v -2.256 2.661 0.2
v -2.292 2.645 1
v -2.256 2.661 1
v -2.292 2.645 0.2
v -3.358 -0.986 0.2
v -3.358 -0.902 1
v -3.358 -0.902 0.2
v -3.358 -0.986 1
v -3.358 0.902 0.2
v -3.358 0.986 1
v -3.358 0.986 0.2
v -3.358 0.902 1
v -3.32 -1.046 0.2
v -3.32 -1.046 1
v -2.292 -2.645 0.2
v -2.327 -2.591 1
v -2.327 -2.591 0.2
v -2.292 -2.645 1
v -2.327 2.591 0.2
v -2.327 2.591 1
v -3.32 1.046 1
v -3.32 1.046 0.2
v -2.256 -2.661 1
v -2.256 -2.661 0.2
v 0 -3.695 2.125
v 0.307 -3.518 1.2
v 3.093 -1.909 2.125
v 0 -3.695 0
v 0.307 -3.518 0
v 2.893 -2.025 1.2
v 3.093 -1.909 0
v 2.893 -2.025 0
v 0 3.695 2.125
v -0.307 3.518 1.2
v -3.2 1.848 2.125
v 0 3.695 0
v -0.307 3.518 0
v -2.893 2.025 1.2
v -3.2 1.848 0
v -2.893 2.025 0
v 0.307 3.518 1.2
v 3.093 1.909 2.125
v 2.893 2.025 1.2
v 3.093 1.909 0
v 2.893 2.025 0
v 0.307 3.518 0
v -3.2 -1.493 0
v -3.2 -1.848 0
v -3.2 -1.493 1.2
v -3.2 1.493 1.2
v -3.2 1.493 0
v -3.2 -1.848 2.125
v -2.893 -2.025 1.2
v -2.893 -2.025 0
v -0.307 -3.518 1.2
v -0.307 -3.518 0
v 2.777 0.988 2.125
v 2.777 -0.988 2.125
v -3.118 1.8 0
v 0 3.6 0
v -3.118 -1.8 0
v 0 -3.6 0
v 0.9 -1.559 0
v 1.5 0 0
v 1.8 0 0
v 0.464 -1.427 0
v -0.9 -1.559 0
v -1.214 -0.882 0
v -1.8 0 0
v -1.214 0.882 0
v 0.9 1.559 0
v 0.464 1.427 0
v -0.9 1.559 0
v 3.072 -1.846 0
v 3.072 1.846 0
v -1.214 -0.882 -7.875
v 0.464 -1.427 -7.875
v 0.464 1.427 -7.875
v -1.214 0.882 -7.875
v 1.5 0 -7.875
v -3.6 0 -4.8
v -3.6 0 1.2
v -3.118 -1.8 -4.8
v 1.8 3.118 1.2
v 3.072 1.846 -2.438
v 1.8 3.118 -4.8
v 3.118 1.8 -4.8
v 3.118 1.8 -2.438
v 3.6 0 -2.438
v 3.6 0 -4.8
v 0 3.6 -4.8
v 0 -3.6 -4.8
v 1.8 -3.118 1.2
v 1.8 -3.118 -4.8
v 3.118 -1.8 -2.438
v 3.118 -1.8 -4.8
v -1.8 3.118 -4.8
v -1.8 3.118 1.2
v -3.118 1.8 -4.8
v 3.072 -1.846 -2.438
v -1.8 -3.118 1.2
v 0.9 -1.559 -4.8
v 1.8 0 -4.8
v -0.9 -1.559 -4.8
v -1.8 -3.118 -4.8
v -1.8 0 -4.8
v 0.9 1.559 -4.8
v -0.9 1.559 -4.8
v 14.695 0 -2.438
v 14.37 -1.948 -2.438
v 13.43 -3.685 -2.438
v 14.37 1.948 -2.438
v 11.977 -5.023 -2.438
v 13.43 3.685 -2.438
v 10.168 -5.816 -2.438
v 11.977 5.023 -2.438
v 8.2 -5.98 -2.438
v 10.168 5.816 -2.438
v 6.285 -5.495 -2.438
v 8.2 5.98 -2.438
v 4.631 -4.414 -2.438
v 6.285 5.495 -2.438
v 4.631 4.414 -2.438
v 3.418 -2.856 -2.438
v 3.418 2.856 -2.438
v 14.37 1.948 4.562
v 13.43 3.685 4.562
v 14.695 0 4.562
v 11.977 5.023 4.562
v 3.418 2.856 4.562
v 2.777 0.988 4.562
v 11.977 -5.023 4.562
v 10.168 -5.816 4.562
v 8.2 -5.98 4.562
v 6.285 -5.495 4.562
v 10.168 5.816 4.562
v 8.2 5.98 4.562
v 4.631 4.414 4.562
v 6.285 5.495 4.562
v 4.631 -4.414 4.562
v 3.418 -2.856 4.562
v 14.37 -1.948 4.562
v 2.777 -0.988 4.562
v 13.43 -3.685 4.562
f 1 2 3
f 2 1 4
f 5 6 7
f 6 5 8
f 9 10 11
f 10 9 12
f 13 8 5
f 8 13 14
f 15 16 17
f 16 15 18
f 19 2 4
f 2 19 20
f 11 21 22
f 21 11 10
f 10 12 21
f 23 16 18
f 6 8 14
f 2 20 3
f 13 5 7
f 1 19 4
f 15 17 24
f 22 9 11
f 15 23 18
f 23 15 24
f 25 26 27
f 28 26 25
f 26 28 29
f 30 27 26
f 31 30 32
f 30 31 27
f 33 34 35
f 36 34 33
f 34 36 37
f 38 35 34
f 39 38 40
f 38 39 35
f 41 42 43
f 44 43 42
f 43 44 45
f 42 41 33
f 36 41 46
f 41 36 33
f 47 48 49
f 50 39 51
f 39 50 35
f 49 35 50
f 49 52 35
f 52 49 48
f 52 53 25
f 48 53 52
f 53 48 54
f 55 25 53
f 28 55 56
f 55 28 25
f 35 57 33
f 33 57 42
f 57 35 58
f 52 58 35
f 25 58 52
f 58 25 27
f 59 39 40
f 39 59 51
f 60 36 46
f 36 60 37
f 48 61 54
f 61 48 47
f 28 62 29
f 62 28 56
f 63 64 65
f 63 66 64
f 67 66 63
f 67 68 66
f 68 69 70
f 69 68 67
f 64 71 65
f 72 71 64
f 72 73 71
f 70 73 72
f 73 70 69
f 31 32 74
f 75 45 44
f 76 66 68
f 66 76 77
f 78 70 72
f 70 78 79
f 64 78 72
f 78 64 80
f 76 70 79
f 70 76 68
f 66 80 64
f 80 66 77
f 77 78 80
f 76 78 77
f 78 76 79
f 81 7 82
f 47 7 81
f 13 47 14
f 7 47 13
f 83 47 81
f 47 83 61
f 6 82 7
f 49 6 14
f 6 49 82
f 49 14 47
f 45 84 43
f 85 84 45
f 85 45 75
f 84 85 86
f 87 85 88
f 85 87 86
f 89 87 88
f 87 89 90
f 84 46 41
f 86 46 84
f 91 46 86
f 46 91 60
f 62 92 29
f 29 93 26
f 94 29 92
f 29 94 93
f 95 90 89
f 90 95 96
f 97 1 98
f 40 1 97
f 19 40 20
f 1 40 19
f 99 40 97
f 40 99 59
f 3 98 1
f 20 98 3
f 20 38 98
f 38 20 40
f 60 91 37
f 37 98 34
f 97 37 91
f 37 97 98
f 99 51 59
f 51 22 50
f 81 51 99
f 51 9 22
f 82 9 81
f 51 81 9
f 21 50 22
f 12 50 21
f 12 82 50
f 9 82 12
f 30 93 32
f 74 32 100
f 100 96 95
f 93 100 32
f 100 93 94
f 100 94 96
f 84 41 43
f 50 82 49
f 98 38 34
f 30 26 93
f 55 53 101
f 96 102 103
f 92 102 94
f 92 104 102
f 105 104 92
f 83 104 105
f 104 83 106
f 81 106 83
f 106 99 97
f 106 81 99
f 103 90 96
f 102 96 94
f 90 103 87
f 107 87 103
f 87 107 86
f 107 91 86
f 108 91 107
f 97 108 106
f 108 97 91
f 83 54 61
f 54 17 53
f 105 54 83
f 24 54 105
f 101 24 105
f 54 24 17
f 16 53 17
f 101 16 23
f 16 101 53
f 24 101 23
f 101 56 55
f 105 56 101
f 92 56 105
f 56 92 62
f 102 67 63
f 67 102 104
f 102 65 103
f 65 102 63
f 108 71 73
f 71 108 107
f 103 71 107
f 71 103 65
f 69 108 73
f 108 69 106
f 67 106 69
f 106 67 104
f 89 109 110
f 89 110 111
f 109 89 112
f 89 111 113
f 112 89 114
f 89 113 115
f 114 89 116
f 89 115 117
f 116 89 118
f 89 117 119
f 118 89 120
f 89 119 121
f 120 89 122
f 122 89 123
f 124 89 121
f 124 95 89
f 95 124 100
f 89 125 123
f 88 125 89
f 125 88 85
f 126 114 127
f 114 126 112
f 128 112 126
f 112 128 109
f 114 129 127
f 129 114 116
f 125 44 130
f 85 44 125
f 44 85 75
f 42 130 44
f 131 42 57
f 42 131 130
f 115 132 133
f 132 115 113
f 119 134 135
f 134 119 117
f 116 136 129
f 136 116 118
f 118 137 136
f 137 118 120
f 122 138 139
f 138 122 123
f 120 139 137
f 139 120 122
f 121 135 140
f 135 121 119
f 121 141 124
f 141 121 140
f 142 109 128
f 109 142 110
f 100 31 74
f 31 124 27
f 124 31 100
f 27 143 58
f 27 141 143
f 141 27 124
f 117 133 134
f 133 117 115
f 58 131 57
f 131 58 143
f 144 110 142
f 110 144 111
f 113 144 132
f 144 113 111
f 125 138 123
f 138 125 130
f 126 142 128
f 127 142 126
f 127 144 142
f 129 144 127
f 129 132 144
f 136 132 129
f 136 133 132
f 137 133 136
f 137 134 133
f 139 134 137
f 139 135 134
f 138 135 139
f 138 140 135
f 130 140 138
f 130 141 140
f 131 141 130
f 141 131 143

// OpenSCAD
// Parameters
shaft_diameter_mm = 3; //[1.5:6:0.1]
length_mm = 10; //[5:20:0.5]
head_across_flats_mm = 6.4; //[3.2:12.8:0.1]
head_height_mm = 2.125; //[1.0625:4.25:0.025]
washer_outer_diameter_mm = 7; //[4:14:0.1]
washer_thickness_mm = 0.8; //[0.4:2:0.05]
washer_hole_clearance_mm = 0.3; //[0.1:0.8:0.05]
spacer_height_mm = 6; //[3:12:0.5]
spacer_wall_mm = 1.8; //[0.9:3.6:0.1]
spacer_clearance_mm = 0.3; //[0.1:0.8:0.05]
buzzer_diameter_mm = 12; //[6:24:0.5]
buzzer_height_mm = 7; //[3.5:14:0.5]
buzzer_offset_x_mm = 10; //[5:20:0.5]
overlap_mm = 1; //[0.5:2:0.1]

// Derived
shaft_r  = shaft_diameter_mm/2;
head_r   = head_across_flats_mm/(2*cos(30)); // circumscribed radius for $fn=6
washer_r = washer_outer_diameter_mm/2;

// Z layout (non-centered solids for robust stacking)
z_head_bottom   = 0;
z_head_top      = z_head_bottom + head_height_mm;

// FIX: make the shank start inside the head and extend down to full length.
// This guarantees a real overlap/merge with the head (no tangential contact).
z_shank_top     = z_head_top - overlap_mm;          // inside head by overlap_mm
z_shank_bottom  = z_head_top - length_mm;           // overall screw length from head top to tip
shank_h         = z_shank_top - z_shank_bottom;     // = length_mm - overlap_mm

// Washer under head, overlapping into head by overlap_mm
z_washer_top    = z_head_bottom + overlap_mm;
z_washer_bottom = z_washer_top - washer_thickness_mm;

// Spacer under washer, overlapping into washer by overlap_mm
z_spacer_top    = z_washer_bottom + overlap_mm;
z_spacer_bottom = z_spacer_top - spacer_height_mm;

// Place buzzer so it physically intersects the head on the side by ~overlap_mm
buzzer_x = head_r + buzzer_diameter_mm/2 - overlap_mm;
buzzer_z = (z_head_bottom + z_head_top)/2;

// Screw and Washer - fused geometry
module screw_and_washer() {
  union() {
    // Hex Head (base at z=0)
    color("DimGray")
      rotate([0, 0, 30])
        translate([0, 0, z_head_bottom])
          cylinder(h=head_height_mm, r=head_r, center=false, $fn=6);

    // Shank (overlaps into head by overlap_mm; full length measured from head top)
    color("DimGray")
      translate([0, 0, z_shank_bottom])
        cylinder(h=shank_h, r=shaft_r, center=false);

    // Washer (overlaps into head by overlap_mm)
    color("DimGray")
      difference() {
        translate([0, 0, z_washer_bottom])
          cylinder(h=washer_thickness_mm, r=washer_r, center=false);
        translate([0, 0, z_washer_bottom - overlap_mm])
          cylinder(h=washer_thickness_mm + 2*overlap_mm,
                   r=(shaft_diameter_mm + washer_hole_clearance_mm)/2,
                   center=false);
      }
  }
}

// PCB Spacer - positioned to overlap washer by overlap_mm
module pcb_spacer() {
  color("Silver")
    difference() {
      translate([0, 0, z_spacer_bottom])
        cylinder(h=spacer_height_mm,
                 r=(shaft_r + spacer_clearance_mm) + spacer_wall_mm,
                 center=false);
      translate([0, 0, z_spacer_bottom - overlap_mm])
        cylinder(h=spacer_height_mm + 2*overlap_mm,
                 r=(shaft_r + spacer_clearance_mm),
                 center=false);
    }
}

// Buzzer - positioned to intersect the hex head (no floating)
module buzzer() {
  color("Black")
    translate([buzzer_x, 0, buzzer_z - buzzer_height_mm/2])
      cylinder(h=buzzer_height_mm, r=buzzer_diameter_mm/2, center=false);
}

// Assembly - single connected solid
module assembly() {
  union() {
    screw_and_washer();
    pcb_spacer();
    buzzer();
  }
}

assembly();
